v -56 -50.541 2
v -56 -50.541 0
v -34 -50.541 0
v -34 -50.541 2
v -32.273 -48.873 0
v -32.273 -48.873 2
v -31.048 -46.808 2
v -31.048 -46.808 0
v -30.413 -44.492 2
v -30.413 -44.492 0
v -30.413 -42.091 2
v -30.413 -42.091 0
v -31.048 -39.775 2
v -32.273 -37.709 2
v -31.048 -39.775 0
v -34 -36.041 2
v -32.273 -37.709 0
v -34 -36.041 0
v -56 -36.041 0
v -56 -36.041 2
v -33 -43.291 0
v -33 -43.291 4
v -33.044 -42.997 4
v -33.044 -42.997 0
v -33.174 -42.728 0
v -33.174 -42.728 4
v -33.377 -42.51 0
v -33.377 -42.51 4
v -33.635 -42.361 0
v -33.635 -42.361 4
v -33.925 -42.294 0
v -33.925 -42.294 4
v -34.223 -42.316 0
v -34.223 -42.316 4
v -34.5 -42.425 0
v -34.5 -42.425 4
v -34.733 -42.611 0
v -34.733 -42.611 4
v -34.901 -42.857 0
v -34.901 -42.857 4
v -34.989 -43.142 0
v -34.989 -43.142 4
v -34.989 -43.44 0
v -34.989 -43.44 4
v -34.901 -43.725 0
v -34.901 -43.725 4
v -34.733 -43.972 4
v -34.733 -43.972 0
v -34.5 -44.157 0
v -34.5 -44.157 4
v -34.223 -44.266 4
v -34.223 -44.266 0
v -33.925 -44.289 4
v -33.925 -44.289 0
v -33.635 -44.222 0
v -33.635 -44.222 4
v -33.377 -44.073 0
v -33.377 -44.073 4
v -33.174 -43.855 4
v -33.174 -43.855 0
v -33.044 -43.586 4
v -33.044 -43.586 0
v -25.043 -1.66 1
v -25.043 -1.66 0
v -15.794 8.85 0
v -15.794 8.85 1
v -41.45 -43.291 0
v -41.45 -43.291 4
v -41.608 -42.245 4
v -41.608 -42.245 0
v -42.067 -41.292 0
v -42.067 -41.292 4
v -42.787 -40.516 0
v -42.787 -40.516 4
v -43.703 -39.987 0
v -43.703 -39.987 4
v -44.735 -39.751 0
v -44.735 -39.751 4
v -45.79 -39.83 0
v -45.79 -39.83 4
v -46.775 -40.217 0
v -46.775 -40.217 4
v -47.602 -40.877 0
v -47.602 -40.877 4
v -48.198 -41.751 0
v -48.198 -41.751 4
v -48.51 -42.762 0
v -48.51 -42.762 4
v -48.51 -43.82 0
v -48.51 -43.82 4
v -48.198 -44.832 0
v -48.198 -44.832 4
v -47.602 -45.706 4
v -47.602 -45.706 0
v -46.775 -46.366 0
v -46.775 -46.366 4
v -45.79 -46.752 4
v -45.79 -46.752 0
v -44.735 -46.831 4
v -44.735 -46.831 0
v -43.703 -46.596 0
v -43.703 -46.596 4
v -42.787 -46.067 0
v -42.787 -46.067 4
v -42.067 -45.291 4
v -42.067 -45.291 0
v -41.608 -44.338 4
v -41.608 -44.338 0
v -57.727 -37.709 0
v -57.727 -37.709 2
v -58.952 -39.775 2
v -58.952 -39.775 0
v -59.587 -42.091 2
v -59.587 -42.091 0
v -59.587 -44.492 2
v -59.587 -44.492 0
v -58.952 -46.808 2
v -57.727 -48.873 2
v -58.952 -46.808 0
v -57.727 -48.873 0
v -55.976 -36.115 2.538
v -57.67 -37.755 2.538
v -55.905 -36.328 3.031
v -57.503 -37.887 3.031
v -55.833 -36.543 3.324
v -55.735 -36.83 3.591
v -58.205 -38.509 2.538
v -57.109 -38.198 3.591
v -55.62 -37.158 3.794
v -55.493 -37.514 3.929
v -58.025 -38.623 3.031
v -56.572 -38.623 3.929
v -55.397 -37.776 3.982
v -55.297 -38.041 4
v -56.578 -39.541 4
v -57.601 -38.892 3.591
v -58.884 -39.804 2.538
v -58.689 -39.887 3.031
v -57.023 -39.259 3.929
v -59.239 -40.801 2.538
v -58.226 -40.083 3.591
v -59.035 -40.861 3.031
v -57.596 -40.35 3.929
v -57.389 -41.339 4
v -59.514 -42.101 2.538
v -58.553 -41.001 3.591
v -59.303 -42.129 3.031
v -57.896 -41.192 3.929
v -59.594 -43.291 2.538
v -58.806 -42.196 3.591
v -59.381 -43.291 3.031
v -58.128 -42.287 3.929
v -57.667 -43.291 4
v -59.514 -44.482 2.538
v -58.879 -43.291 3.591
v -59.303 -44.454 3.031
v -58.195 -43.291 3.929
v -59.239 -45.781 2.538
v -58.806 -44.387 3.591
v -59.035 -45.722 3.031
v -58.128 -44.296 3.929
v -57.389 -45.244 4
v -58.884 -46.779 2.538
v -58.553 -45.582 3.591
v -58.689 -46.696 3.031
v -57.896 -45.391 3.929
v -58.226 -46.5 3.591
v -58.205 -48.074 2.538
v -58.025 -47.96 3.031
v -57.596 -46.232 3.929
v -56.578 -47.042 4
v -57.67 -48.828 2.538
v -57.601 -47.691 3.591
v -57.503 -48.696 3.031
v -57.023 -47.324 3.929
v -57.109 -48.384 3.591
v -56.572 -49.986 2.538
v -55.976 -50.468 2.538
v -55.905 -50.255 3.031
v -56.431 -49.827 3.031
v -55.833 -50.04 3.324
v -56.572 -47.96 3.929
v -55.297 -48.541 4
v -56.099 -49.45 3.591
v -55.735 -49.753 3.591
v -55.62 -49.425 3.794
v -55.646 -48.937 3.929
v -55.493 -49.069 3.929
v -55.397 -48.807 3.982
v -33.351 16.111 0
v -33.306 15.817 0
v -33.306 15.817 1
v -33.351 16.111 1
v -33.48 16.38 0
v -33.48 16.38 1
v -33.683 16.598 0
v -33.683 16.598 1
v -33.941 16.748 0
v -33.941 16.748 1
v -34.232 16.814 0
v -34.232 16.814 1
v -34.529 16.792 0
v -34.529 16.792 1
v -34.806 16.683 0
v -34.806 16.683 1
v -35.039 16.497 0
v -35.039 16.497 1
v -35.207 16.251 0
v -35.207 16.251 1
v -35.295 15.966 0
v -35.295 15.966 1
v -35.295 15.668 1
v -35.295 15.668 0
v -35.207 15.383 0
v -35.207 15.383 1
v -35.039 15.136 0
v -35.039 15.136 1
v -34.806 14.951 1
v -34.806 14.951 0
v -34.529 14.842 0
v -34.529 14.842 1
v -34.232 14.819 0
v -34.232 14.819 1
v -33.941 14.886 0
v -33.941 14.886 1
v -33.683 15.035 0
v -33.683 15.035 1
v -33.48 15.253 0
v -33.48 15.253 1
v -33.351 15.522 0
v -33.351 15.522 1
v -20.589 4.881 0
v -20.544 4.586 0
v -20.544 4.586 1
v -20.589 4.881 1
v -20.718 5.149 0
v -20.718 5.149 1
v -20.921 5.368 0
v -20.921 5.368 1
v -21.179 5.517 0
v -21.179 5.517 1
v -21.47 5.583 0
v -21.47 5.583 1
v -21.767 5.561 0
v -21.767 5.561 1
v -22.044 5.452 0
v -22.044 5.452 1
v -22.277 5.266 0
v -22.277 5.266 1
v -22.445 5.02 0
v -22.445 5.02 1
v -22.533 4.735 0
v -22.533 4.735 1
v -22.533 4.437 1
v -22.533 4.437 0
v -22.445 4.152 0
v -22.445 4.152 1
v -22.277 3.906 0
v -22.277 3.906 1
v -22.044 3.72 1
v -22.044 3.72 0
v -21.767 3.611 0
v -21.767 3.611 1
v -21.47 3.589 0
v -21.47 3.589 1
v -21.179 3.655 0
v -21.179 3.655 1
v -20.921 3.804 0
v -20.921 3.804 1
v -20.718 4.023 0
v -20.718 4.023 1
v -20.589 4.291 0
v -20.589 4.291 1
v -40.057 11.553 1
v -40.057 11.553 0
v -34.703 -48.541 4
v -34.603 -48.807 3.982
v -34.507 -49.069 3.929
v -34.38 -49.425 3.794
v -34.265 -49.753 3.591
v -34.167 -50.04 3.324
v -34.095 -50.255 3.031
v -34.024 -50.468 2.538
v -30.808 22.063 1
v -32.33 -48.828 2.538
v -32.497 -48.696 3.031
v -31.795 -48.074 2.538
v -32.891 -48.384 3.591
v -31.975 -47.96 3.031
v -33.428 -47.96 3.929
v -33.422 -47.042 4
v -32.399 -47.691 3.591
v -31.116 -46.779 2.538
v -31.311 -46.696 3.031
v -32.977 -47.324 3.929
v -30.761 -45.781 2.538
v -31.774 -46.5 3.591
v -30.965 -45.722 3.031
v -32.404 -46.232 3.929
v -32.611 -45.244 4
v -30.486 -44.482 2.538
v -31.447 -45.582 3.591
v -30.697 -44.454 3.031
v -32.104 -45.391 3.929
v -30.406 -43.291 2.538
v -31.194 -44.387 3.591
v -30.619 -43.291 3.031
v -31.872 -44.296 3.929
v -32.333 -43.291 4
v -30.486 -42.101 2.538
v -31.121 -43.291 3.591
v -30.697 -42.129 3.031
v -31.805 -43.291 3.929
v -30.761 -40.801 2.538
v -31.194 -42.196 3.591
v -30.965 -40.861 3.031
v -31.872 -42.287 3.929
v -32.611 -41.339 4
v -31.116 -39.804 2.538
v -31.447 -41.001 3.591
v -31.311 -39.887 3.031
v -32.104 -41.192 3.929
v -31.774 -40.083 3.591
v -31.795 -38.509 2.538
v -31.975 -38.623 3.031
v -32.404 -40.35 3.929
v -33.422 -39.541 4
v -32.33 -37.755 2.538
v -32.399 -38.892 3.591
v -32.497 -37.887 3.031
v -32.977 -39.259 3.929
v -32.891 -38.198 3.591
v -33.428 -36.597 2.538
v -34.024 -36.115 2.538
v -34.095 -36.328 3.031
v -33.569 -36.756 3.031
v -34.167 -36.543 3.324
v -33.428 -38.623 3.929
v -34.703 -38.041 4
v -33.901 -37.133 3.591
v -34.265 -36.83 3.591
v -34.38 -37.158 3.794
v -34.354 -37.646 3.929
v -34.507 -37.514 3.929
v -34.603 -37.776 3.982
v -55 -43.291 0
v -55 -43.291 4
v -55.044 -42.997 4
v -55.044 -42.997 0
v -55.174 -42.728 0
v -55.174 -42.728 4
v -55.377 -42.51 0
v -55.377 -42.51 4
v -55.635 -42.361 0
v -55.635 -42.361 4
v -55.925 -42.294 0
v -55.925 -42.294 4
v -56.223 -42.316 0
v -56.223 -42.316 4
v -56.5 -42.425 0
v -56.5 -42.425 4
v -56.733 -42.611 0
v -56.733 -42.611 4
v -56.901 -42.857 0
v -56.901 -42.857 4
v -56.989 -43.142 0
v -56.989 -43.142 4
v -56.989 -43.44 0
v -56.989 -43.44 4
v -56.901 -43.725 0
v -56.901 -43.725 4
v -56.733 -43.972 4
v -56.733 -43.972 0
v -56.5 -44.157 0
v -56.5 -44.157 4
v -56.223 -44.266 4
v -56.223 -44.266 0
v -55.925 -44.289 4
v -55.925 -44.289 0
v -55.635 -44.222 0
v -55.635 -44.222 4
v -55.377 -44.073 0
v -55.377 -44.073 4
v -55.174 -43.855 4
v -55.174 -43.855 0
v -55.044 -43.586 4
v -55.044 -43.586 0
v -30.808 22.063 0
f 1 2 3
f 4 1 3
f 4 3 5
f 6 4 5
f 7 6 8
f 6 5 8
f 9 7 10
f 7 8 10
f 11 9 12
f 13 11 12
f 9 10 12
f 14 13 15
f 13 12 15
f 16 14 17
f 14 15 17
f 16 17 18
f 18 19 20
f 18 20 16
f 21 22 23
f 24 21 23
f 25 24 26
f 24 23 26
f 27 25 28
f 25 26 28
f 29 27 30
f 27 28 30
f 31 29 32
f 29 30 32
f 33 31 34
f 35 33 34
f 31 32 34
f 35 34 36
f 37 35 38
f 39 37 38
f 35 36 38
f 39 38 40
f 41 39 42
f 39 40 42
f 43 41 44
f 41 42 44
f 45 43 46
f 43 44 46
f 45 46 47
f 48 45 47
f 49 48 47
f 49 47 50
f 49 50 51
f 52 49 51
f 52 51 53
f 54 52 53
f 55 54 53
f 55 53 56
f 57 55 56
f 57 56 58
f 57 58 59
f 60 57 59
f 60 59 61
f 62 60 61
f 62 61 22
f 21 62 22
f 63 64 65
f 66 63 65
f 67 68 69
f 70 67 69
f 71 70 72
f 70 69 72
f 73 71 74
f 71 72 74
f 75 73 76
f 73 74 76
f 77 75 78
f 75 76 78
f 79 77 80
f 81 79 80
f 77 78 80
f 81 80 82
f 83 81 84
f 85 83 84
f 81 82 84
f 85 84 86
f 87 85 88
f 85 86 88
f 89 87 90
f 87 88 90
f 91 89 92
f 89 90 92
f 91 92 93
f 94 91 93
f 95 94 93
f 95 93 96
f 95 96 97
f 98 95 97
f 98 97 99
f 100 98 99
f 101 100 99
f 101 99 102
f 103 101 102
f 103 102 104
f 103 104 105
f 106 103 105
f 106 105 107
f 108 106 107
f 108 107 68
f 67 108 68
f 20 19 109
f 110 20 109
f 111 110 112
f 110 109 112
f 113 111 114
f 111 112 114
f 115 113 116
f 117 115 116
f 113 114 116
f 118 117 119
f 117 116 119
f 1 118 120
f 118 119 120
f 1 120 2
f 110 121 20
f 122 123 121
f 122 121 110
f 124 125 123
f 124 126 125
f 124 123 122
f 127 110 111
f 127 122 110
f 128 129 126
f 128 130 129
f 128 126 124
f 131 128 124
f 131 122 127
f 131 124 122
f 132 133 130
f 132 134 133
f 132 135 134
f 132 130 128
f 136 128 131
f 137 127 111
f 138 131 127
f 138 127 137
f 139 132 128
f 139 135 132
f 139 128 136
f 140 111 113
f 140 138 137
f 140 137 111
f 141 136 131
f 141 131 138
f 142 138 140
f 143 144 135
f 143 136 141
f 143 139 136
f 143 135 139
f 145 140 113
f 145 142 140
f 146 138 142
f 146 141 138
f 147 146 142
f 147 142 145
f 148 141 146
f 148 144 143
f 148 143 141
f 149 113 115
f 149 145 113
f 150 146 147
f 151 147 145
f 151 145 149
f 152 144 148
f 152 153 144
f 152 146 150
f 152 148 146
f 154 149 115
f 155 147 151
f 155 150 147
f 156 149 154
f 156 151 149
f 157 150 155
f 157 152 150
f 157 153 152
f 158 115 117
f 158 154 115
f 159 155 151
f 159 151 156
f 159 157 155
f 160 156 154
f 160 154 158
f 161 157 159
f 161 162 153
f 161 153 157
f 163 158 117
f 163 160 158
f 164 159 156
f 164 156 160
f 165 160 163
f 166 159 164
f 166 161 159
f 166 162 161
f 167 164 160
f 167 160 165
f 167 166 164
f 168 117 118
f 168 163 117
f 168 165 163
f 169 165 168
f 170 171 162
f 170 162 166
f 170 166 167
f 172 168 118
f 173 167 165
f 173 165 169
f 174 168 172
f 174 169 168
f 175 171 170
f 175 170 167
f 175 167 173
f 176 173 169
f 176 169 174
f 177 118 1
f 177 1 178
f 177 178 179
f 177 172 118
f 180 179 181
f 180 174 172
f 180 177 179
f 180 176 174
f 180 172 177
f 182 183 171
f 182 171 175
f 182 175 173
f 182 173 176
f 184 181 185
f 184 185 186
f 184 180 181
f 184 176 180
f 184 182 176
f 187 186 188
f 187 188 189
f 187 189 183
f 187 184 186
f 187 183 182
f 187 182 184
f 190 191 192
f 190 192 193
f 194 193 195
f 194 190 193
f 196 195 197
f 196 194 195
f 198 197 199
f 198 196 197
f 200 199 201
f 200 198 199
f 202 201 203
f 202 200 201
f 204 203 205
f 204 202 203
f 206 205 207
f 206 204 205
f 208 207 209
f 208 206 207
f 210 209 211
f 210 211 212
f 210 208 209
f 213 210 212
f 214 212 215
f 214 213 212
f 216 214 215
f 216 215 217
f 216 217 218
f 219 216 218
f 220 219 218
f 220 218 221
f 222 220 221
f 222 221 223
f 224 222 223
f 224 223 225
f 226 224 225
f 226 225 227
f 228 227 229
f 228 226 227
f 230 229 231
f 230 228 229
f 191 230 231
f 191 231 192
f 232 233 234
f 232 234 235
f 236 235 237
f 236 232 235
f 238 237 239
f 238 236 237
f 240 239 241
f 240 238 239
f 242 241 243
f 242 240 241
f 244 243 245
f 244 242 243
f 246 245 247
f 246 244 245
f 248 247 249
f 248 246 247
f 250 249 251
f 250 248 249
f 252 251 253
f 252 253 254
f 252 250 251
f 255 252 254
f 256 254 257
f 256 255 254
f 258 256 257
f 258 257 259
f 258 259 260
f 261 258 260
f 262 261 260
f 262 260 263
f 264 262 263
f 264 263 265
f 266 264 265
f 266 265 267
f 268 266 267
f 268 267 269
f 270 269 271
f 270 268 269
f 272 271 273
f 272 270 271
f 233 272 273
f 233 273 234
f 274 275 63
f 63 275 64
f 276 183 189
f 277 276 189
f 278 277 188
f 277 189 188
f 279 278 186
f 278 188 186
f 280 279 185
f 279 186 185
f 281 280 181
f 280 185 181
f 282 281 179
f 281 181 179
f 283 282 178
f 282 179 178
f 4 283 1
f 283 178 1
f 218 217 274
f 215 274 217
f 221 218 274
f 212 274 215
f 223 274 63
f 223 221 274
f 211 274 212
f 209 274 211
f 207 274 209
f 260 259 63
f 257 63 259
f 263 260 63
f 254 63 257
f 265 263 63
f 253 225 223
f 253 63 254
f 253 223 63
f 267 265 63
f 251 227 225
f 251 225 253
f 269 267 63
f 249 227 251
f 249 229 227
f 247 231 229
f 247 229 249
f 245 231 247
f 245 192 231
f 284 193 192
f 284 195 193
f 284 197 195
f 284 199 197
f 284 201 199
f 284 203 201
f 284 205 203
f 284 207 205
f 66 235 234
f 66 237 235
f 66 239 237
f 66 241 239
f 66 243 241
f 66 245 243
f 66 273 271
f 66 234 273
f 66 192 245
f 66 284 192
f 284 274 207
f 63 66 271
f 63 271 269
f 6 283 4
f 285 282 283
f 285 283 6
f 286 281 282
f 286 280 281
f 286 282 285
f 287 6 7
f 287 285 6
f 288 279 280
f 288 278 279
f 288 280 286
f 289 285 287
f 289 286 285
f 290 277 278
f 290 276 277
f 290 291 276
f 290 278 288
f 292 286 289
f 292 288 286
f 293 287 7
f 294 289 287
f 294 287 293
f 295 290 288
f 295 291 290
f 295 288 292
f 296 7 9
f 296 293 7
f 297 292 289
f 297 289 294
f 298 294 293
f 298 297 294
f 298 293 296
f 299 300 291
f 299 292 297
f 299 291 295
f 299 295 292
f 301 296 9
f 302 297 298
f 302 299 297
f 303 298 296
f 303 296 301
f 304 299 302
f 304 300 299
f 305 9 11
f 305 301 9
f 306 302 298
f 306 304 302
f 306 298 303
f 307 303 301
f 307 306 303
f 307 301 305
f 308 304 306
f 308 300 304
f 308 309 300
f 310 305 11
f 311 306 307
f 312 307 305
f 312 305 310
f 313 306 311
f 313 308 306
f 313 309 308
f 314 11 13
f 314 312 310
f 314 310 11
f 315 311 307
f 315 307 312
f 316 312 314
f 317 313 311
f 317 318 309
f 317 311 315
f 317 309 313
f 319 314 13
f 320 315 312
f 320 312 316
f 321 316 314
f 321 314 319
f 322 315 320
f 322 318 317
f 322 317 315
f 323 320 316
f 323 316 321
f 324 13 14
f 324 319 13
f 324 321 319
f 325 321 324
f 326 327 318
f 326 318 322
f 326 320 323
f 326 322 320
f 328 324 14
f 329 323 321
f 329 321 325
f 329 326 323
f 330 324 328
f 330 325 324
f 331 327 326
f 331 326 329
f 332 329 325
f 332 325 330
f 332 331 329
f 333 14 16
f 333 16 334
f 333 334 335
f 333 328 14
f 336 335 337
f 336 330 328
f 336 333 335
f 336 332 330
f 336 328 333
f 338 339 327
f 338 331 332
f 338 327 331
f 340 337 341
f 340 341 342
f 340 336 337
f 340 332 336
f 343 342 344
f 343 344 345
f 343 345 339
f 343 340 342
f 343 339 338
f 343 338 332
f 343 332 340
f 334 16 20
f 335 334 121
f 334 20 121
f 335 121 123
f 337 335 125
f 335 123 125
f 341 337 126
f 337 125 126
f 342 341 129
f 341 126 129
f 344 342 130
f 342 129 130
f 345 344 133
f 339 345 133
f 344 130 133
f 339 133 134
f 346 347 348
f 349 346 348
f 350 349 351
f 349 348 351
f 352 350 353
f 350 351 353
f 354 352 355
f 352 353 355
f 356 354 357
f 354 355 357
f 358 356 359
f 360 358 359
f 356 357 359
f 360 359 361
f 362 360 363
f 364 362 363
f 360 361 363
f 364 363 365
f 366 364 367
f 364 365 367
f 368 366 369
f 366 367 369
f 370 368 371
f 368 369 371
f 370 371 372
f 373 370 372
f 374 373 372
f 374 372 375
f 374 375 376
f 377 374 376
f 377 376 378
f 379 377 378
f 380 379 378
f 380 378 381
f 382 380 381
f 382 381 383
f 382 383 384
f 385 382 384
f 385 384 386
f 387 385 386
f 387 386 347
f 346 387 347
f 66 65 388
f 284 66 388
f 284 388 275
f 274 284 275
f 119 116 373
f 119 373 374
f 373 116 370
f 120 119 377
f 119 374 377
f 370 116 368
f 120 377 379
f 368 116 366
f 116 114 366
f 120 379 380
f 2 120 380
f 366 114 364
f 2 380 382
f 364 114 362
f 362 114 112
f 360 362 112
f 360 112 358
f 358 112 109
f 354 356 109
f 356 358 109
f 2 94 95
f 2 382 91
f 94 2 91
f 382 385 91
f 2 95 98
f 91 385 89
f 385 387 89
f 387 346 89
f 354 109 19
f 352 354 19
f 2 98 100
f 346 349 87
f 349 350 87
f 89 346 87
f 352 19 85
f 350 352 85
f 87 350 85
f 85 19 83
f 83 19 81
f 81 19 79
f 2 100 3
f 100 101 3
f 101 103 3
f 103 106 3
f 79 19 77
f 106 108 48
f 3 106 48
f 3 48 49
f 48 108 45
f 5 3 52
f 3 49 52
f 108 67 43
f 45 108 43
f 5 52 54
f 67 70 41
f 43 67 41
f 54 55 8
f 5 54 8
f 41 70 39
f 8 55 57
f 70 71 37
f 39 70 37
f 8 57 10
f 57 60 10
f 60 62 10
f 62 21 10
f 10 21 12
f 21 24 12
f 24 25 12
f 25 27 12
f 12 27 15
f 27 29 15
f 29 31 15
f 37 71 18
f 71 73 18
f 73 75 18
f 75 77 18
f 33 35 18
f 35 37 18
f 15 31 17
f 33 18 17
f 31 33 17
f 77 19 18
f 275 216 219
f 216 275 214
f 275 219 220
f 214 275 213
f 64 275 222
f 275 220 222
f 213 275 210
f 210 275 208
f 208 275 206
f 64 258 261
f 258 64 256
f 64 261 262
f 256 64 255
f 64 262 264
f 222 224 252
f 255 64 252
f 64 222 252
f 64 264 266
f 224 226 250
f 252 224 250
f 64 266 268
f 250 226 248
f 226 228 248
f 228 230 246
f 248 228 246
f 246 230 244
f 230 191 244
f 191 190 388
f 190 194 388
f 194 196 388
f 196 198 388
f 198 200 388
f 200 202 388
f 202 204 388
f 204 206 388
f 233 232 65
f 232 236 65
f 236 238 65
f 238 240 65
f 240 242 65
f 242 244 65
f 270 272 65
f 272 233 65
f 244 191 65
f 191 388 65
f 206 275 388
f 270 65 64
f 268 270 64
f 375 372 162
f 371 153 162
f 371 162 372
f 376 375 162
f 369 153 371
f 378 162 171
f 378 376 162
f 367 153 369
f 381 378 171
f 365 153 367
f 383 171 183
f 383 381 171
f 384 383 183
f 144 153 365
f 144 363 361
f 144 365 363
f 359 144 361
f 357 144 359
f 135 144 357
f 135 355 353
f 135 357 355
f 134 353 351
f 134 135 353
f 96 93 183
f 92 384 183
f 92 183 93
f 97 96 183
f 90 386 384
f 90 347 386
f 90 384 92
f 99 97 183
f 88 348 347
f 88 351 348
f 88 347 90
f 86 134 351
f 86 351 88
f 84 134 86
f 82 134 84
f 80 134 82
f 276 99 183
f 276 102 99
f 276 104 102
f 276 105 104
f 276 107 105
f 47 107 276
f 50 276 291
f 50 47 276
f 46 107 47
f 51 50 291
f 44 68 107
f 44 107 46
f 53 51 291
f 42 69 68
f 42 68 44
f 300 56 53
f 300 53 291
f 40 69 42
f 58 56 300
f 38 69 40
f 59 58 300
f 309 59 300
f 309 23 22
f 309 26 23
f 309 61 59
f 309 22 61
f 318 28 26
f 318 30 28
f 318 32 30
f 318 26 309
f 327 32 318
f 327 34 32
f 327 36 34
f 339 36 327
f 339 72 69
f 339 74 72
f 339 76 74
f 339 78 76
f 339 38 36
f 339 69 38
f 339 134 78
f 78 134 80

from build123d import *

# Parameters (mm, degrees)
F0_R        = 1
F1_DEPTH    = 1
F2_W        = 22
F2_H        = 14.5
F3_DEPTH    = 4
F4_R        = 1
F4_R_2      = 3.55
F5_DEPTH    = 5
F6_T1_DEPTH = 32
F6_T4_ANGLE = 171.0262354859
F6_T6_ANGLE = 171.0262354859


# Not quite as in the source:
# - a fillet or chamfer that OpenCascade refuses, or shapes differently, is made with other operations: its cross-section is extruded or revolved along the edge and cut away or added


with BuildPart() as f1:
    # F0 (on Top) → F1 (new body)
    with BuildSketch(Plane.XY):
        Polygon((-15.7937894361, 8.8500456174), (-30.8080597745, 22.0626035153), (-40.056850303, 11.5526142783), (-25.0425799646, -1.6599436195), align=None)
        with Locations((-21.5442549757, 4.5859928413)):
            Circle(F0_R, mode=Mode.SUBTRACT)
        with Locations((-34.3063847634, 15.8166670545)):
            Circle(F0_R, mode=Mode.SUBTRACT)
    extrude(amount=F1_DEPTH)


with BuildPart() as f3:
    # F2 (on Top) → F3 (new body)
    with BuildSketch(Plane.XY):
        with Locations((-45, -43.2913755476)):
            Rectangle(F2_W, F2_H)
        with BuildLine():
            ThreePointArc((-34, -50.5413755476), (-30.3326822519, -43.2913755476), (-34, -36.0413755476))
            Line((-34, -36.0413755476), (-34, -50.5413755476))
        make_face()
        with BuildLine():
            Line((-56, -50.5413755476), (-56, -36.0413755476))
            ThreePointArc((-56, -36.0413755476), (-59.6673177481, -43.2913755476), (-56, -50.5413755476))
        make_face()
    extrude(amount=F3_DEPTH)

    # F4 (on face) → F5 (cut)
    with BuildSketch(Plane.XY.offset(4)):
        with Locations((-56, -43.2913755476)):
            Circle(F4_R)
        with Locations((-34, -43.2913755476)):
            Circle(F4_R)
        with Locations((-45, -43.2913755476)):
            Circle(F4_R_2)
    extrude(amount=-F5_DEPTH, mode=Mode.SUBTRACT)

    # F6: fillet of radius 2 on 4 edges, made by hand

    # F6_s2 → F6_t1 (cut)
    with BuildSketch(Plane.YZ.offset(-61)):
        with BuildLine():
            ThreePointArc((-48.5413755476, 4), (-49.95558911, 3.4142135624), (-50.5413755476, 2))
            Line((-50.5413755476, 2), (-50.5413755476, 4))
            Line((-50.5413755476, 4), (-48.5413755476, 4))
        make_face()
        with BuildLine():
            ThreePointArc((-36.0413755476, 2), (-36.6271619853, 3.4142135624), (-38.0413755476, 4))
            Line((-38.0413755476, 4), (-36.0413755476, 4))
            Line((-36.0413755476, 4), (-36.0413755476, 2))
        make_face()
    extrude(amount=F6_T1_DEPTH, mode=Mode.SUBTRACT)

    # F6_s3 → F6_t4 (revolve, cut)
    with BuildSketch(Plane(origin=(-53.7335722058, -4.2165456866, 0), x_dir=(0, 0, 1), z_dir=(0.9969352706, 0.0782308516, 0))):
        with BuildLine():
            ThreePointArc((2, 30.1949517804), (3.4142135624, 30.7807382181), (4, 32.1949517804))
            Line((4, 32.1949517804), (4, 30.1949517804))
            Line((4, 30.1949517804), (2, 30.1949517804))
        make_face()
    revolve(axis=Axis((-50.6673177481, -43.2913755476, 4), (0, 0, 1)), revolution_arc=F6_T4_ANGLE, mode=Mode.SUBTRACT)

    # F6_s5 → F6_t6 (revolve, cut)
    with BuildSketch(Plane(origin=(-42.4683054286, -3.33254505, 0), x_dir=(0, 0, 1), z_dir=(-0.9969352706, -0.0782308516, 0))):
        with BuildLine():
            ThreePointArc((2, -49.0816699683), (3.4142135624, -48.4958835307), (4, -47.0816699683))
            Line((4, -47.0816699683), (4, -49.0816699683))
            Line((4, -49.0816699683), (2, -49.0816699683))
        make_face()
    revolve(axis=Axis((-39.3326822519, -43.2913755476, 4), (0, 0, 1)), revolution_arc=F6_T6_ANGLE, mode=Mode.SUBTRACT)


solid = Compound([f1.part, f3.part])
